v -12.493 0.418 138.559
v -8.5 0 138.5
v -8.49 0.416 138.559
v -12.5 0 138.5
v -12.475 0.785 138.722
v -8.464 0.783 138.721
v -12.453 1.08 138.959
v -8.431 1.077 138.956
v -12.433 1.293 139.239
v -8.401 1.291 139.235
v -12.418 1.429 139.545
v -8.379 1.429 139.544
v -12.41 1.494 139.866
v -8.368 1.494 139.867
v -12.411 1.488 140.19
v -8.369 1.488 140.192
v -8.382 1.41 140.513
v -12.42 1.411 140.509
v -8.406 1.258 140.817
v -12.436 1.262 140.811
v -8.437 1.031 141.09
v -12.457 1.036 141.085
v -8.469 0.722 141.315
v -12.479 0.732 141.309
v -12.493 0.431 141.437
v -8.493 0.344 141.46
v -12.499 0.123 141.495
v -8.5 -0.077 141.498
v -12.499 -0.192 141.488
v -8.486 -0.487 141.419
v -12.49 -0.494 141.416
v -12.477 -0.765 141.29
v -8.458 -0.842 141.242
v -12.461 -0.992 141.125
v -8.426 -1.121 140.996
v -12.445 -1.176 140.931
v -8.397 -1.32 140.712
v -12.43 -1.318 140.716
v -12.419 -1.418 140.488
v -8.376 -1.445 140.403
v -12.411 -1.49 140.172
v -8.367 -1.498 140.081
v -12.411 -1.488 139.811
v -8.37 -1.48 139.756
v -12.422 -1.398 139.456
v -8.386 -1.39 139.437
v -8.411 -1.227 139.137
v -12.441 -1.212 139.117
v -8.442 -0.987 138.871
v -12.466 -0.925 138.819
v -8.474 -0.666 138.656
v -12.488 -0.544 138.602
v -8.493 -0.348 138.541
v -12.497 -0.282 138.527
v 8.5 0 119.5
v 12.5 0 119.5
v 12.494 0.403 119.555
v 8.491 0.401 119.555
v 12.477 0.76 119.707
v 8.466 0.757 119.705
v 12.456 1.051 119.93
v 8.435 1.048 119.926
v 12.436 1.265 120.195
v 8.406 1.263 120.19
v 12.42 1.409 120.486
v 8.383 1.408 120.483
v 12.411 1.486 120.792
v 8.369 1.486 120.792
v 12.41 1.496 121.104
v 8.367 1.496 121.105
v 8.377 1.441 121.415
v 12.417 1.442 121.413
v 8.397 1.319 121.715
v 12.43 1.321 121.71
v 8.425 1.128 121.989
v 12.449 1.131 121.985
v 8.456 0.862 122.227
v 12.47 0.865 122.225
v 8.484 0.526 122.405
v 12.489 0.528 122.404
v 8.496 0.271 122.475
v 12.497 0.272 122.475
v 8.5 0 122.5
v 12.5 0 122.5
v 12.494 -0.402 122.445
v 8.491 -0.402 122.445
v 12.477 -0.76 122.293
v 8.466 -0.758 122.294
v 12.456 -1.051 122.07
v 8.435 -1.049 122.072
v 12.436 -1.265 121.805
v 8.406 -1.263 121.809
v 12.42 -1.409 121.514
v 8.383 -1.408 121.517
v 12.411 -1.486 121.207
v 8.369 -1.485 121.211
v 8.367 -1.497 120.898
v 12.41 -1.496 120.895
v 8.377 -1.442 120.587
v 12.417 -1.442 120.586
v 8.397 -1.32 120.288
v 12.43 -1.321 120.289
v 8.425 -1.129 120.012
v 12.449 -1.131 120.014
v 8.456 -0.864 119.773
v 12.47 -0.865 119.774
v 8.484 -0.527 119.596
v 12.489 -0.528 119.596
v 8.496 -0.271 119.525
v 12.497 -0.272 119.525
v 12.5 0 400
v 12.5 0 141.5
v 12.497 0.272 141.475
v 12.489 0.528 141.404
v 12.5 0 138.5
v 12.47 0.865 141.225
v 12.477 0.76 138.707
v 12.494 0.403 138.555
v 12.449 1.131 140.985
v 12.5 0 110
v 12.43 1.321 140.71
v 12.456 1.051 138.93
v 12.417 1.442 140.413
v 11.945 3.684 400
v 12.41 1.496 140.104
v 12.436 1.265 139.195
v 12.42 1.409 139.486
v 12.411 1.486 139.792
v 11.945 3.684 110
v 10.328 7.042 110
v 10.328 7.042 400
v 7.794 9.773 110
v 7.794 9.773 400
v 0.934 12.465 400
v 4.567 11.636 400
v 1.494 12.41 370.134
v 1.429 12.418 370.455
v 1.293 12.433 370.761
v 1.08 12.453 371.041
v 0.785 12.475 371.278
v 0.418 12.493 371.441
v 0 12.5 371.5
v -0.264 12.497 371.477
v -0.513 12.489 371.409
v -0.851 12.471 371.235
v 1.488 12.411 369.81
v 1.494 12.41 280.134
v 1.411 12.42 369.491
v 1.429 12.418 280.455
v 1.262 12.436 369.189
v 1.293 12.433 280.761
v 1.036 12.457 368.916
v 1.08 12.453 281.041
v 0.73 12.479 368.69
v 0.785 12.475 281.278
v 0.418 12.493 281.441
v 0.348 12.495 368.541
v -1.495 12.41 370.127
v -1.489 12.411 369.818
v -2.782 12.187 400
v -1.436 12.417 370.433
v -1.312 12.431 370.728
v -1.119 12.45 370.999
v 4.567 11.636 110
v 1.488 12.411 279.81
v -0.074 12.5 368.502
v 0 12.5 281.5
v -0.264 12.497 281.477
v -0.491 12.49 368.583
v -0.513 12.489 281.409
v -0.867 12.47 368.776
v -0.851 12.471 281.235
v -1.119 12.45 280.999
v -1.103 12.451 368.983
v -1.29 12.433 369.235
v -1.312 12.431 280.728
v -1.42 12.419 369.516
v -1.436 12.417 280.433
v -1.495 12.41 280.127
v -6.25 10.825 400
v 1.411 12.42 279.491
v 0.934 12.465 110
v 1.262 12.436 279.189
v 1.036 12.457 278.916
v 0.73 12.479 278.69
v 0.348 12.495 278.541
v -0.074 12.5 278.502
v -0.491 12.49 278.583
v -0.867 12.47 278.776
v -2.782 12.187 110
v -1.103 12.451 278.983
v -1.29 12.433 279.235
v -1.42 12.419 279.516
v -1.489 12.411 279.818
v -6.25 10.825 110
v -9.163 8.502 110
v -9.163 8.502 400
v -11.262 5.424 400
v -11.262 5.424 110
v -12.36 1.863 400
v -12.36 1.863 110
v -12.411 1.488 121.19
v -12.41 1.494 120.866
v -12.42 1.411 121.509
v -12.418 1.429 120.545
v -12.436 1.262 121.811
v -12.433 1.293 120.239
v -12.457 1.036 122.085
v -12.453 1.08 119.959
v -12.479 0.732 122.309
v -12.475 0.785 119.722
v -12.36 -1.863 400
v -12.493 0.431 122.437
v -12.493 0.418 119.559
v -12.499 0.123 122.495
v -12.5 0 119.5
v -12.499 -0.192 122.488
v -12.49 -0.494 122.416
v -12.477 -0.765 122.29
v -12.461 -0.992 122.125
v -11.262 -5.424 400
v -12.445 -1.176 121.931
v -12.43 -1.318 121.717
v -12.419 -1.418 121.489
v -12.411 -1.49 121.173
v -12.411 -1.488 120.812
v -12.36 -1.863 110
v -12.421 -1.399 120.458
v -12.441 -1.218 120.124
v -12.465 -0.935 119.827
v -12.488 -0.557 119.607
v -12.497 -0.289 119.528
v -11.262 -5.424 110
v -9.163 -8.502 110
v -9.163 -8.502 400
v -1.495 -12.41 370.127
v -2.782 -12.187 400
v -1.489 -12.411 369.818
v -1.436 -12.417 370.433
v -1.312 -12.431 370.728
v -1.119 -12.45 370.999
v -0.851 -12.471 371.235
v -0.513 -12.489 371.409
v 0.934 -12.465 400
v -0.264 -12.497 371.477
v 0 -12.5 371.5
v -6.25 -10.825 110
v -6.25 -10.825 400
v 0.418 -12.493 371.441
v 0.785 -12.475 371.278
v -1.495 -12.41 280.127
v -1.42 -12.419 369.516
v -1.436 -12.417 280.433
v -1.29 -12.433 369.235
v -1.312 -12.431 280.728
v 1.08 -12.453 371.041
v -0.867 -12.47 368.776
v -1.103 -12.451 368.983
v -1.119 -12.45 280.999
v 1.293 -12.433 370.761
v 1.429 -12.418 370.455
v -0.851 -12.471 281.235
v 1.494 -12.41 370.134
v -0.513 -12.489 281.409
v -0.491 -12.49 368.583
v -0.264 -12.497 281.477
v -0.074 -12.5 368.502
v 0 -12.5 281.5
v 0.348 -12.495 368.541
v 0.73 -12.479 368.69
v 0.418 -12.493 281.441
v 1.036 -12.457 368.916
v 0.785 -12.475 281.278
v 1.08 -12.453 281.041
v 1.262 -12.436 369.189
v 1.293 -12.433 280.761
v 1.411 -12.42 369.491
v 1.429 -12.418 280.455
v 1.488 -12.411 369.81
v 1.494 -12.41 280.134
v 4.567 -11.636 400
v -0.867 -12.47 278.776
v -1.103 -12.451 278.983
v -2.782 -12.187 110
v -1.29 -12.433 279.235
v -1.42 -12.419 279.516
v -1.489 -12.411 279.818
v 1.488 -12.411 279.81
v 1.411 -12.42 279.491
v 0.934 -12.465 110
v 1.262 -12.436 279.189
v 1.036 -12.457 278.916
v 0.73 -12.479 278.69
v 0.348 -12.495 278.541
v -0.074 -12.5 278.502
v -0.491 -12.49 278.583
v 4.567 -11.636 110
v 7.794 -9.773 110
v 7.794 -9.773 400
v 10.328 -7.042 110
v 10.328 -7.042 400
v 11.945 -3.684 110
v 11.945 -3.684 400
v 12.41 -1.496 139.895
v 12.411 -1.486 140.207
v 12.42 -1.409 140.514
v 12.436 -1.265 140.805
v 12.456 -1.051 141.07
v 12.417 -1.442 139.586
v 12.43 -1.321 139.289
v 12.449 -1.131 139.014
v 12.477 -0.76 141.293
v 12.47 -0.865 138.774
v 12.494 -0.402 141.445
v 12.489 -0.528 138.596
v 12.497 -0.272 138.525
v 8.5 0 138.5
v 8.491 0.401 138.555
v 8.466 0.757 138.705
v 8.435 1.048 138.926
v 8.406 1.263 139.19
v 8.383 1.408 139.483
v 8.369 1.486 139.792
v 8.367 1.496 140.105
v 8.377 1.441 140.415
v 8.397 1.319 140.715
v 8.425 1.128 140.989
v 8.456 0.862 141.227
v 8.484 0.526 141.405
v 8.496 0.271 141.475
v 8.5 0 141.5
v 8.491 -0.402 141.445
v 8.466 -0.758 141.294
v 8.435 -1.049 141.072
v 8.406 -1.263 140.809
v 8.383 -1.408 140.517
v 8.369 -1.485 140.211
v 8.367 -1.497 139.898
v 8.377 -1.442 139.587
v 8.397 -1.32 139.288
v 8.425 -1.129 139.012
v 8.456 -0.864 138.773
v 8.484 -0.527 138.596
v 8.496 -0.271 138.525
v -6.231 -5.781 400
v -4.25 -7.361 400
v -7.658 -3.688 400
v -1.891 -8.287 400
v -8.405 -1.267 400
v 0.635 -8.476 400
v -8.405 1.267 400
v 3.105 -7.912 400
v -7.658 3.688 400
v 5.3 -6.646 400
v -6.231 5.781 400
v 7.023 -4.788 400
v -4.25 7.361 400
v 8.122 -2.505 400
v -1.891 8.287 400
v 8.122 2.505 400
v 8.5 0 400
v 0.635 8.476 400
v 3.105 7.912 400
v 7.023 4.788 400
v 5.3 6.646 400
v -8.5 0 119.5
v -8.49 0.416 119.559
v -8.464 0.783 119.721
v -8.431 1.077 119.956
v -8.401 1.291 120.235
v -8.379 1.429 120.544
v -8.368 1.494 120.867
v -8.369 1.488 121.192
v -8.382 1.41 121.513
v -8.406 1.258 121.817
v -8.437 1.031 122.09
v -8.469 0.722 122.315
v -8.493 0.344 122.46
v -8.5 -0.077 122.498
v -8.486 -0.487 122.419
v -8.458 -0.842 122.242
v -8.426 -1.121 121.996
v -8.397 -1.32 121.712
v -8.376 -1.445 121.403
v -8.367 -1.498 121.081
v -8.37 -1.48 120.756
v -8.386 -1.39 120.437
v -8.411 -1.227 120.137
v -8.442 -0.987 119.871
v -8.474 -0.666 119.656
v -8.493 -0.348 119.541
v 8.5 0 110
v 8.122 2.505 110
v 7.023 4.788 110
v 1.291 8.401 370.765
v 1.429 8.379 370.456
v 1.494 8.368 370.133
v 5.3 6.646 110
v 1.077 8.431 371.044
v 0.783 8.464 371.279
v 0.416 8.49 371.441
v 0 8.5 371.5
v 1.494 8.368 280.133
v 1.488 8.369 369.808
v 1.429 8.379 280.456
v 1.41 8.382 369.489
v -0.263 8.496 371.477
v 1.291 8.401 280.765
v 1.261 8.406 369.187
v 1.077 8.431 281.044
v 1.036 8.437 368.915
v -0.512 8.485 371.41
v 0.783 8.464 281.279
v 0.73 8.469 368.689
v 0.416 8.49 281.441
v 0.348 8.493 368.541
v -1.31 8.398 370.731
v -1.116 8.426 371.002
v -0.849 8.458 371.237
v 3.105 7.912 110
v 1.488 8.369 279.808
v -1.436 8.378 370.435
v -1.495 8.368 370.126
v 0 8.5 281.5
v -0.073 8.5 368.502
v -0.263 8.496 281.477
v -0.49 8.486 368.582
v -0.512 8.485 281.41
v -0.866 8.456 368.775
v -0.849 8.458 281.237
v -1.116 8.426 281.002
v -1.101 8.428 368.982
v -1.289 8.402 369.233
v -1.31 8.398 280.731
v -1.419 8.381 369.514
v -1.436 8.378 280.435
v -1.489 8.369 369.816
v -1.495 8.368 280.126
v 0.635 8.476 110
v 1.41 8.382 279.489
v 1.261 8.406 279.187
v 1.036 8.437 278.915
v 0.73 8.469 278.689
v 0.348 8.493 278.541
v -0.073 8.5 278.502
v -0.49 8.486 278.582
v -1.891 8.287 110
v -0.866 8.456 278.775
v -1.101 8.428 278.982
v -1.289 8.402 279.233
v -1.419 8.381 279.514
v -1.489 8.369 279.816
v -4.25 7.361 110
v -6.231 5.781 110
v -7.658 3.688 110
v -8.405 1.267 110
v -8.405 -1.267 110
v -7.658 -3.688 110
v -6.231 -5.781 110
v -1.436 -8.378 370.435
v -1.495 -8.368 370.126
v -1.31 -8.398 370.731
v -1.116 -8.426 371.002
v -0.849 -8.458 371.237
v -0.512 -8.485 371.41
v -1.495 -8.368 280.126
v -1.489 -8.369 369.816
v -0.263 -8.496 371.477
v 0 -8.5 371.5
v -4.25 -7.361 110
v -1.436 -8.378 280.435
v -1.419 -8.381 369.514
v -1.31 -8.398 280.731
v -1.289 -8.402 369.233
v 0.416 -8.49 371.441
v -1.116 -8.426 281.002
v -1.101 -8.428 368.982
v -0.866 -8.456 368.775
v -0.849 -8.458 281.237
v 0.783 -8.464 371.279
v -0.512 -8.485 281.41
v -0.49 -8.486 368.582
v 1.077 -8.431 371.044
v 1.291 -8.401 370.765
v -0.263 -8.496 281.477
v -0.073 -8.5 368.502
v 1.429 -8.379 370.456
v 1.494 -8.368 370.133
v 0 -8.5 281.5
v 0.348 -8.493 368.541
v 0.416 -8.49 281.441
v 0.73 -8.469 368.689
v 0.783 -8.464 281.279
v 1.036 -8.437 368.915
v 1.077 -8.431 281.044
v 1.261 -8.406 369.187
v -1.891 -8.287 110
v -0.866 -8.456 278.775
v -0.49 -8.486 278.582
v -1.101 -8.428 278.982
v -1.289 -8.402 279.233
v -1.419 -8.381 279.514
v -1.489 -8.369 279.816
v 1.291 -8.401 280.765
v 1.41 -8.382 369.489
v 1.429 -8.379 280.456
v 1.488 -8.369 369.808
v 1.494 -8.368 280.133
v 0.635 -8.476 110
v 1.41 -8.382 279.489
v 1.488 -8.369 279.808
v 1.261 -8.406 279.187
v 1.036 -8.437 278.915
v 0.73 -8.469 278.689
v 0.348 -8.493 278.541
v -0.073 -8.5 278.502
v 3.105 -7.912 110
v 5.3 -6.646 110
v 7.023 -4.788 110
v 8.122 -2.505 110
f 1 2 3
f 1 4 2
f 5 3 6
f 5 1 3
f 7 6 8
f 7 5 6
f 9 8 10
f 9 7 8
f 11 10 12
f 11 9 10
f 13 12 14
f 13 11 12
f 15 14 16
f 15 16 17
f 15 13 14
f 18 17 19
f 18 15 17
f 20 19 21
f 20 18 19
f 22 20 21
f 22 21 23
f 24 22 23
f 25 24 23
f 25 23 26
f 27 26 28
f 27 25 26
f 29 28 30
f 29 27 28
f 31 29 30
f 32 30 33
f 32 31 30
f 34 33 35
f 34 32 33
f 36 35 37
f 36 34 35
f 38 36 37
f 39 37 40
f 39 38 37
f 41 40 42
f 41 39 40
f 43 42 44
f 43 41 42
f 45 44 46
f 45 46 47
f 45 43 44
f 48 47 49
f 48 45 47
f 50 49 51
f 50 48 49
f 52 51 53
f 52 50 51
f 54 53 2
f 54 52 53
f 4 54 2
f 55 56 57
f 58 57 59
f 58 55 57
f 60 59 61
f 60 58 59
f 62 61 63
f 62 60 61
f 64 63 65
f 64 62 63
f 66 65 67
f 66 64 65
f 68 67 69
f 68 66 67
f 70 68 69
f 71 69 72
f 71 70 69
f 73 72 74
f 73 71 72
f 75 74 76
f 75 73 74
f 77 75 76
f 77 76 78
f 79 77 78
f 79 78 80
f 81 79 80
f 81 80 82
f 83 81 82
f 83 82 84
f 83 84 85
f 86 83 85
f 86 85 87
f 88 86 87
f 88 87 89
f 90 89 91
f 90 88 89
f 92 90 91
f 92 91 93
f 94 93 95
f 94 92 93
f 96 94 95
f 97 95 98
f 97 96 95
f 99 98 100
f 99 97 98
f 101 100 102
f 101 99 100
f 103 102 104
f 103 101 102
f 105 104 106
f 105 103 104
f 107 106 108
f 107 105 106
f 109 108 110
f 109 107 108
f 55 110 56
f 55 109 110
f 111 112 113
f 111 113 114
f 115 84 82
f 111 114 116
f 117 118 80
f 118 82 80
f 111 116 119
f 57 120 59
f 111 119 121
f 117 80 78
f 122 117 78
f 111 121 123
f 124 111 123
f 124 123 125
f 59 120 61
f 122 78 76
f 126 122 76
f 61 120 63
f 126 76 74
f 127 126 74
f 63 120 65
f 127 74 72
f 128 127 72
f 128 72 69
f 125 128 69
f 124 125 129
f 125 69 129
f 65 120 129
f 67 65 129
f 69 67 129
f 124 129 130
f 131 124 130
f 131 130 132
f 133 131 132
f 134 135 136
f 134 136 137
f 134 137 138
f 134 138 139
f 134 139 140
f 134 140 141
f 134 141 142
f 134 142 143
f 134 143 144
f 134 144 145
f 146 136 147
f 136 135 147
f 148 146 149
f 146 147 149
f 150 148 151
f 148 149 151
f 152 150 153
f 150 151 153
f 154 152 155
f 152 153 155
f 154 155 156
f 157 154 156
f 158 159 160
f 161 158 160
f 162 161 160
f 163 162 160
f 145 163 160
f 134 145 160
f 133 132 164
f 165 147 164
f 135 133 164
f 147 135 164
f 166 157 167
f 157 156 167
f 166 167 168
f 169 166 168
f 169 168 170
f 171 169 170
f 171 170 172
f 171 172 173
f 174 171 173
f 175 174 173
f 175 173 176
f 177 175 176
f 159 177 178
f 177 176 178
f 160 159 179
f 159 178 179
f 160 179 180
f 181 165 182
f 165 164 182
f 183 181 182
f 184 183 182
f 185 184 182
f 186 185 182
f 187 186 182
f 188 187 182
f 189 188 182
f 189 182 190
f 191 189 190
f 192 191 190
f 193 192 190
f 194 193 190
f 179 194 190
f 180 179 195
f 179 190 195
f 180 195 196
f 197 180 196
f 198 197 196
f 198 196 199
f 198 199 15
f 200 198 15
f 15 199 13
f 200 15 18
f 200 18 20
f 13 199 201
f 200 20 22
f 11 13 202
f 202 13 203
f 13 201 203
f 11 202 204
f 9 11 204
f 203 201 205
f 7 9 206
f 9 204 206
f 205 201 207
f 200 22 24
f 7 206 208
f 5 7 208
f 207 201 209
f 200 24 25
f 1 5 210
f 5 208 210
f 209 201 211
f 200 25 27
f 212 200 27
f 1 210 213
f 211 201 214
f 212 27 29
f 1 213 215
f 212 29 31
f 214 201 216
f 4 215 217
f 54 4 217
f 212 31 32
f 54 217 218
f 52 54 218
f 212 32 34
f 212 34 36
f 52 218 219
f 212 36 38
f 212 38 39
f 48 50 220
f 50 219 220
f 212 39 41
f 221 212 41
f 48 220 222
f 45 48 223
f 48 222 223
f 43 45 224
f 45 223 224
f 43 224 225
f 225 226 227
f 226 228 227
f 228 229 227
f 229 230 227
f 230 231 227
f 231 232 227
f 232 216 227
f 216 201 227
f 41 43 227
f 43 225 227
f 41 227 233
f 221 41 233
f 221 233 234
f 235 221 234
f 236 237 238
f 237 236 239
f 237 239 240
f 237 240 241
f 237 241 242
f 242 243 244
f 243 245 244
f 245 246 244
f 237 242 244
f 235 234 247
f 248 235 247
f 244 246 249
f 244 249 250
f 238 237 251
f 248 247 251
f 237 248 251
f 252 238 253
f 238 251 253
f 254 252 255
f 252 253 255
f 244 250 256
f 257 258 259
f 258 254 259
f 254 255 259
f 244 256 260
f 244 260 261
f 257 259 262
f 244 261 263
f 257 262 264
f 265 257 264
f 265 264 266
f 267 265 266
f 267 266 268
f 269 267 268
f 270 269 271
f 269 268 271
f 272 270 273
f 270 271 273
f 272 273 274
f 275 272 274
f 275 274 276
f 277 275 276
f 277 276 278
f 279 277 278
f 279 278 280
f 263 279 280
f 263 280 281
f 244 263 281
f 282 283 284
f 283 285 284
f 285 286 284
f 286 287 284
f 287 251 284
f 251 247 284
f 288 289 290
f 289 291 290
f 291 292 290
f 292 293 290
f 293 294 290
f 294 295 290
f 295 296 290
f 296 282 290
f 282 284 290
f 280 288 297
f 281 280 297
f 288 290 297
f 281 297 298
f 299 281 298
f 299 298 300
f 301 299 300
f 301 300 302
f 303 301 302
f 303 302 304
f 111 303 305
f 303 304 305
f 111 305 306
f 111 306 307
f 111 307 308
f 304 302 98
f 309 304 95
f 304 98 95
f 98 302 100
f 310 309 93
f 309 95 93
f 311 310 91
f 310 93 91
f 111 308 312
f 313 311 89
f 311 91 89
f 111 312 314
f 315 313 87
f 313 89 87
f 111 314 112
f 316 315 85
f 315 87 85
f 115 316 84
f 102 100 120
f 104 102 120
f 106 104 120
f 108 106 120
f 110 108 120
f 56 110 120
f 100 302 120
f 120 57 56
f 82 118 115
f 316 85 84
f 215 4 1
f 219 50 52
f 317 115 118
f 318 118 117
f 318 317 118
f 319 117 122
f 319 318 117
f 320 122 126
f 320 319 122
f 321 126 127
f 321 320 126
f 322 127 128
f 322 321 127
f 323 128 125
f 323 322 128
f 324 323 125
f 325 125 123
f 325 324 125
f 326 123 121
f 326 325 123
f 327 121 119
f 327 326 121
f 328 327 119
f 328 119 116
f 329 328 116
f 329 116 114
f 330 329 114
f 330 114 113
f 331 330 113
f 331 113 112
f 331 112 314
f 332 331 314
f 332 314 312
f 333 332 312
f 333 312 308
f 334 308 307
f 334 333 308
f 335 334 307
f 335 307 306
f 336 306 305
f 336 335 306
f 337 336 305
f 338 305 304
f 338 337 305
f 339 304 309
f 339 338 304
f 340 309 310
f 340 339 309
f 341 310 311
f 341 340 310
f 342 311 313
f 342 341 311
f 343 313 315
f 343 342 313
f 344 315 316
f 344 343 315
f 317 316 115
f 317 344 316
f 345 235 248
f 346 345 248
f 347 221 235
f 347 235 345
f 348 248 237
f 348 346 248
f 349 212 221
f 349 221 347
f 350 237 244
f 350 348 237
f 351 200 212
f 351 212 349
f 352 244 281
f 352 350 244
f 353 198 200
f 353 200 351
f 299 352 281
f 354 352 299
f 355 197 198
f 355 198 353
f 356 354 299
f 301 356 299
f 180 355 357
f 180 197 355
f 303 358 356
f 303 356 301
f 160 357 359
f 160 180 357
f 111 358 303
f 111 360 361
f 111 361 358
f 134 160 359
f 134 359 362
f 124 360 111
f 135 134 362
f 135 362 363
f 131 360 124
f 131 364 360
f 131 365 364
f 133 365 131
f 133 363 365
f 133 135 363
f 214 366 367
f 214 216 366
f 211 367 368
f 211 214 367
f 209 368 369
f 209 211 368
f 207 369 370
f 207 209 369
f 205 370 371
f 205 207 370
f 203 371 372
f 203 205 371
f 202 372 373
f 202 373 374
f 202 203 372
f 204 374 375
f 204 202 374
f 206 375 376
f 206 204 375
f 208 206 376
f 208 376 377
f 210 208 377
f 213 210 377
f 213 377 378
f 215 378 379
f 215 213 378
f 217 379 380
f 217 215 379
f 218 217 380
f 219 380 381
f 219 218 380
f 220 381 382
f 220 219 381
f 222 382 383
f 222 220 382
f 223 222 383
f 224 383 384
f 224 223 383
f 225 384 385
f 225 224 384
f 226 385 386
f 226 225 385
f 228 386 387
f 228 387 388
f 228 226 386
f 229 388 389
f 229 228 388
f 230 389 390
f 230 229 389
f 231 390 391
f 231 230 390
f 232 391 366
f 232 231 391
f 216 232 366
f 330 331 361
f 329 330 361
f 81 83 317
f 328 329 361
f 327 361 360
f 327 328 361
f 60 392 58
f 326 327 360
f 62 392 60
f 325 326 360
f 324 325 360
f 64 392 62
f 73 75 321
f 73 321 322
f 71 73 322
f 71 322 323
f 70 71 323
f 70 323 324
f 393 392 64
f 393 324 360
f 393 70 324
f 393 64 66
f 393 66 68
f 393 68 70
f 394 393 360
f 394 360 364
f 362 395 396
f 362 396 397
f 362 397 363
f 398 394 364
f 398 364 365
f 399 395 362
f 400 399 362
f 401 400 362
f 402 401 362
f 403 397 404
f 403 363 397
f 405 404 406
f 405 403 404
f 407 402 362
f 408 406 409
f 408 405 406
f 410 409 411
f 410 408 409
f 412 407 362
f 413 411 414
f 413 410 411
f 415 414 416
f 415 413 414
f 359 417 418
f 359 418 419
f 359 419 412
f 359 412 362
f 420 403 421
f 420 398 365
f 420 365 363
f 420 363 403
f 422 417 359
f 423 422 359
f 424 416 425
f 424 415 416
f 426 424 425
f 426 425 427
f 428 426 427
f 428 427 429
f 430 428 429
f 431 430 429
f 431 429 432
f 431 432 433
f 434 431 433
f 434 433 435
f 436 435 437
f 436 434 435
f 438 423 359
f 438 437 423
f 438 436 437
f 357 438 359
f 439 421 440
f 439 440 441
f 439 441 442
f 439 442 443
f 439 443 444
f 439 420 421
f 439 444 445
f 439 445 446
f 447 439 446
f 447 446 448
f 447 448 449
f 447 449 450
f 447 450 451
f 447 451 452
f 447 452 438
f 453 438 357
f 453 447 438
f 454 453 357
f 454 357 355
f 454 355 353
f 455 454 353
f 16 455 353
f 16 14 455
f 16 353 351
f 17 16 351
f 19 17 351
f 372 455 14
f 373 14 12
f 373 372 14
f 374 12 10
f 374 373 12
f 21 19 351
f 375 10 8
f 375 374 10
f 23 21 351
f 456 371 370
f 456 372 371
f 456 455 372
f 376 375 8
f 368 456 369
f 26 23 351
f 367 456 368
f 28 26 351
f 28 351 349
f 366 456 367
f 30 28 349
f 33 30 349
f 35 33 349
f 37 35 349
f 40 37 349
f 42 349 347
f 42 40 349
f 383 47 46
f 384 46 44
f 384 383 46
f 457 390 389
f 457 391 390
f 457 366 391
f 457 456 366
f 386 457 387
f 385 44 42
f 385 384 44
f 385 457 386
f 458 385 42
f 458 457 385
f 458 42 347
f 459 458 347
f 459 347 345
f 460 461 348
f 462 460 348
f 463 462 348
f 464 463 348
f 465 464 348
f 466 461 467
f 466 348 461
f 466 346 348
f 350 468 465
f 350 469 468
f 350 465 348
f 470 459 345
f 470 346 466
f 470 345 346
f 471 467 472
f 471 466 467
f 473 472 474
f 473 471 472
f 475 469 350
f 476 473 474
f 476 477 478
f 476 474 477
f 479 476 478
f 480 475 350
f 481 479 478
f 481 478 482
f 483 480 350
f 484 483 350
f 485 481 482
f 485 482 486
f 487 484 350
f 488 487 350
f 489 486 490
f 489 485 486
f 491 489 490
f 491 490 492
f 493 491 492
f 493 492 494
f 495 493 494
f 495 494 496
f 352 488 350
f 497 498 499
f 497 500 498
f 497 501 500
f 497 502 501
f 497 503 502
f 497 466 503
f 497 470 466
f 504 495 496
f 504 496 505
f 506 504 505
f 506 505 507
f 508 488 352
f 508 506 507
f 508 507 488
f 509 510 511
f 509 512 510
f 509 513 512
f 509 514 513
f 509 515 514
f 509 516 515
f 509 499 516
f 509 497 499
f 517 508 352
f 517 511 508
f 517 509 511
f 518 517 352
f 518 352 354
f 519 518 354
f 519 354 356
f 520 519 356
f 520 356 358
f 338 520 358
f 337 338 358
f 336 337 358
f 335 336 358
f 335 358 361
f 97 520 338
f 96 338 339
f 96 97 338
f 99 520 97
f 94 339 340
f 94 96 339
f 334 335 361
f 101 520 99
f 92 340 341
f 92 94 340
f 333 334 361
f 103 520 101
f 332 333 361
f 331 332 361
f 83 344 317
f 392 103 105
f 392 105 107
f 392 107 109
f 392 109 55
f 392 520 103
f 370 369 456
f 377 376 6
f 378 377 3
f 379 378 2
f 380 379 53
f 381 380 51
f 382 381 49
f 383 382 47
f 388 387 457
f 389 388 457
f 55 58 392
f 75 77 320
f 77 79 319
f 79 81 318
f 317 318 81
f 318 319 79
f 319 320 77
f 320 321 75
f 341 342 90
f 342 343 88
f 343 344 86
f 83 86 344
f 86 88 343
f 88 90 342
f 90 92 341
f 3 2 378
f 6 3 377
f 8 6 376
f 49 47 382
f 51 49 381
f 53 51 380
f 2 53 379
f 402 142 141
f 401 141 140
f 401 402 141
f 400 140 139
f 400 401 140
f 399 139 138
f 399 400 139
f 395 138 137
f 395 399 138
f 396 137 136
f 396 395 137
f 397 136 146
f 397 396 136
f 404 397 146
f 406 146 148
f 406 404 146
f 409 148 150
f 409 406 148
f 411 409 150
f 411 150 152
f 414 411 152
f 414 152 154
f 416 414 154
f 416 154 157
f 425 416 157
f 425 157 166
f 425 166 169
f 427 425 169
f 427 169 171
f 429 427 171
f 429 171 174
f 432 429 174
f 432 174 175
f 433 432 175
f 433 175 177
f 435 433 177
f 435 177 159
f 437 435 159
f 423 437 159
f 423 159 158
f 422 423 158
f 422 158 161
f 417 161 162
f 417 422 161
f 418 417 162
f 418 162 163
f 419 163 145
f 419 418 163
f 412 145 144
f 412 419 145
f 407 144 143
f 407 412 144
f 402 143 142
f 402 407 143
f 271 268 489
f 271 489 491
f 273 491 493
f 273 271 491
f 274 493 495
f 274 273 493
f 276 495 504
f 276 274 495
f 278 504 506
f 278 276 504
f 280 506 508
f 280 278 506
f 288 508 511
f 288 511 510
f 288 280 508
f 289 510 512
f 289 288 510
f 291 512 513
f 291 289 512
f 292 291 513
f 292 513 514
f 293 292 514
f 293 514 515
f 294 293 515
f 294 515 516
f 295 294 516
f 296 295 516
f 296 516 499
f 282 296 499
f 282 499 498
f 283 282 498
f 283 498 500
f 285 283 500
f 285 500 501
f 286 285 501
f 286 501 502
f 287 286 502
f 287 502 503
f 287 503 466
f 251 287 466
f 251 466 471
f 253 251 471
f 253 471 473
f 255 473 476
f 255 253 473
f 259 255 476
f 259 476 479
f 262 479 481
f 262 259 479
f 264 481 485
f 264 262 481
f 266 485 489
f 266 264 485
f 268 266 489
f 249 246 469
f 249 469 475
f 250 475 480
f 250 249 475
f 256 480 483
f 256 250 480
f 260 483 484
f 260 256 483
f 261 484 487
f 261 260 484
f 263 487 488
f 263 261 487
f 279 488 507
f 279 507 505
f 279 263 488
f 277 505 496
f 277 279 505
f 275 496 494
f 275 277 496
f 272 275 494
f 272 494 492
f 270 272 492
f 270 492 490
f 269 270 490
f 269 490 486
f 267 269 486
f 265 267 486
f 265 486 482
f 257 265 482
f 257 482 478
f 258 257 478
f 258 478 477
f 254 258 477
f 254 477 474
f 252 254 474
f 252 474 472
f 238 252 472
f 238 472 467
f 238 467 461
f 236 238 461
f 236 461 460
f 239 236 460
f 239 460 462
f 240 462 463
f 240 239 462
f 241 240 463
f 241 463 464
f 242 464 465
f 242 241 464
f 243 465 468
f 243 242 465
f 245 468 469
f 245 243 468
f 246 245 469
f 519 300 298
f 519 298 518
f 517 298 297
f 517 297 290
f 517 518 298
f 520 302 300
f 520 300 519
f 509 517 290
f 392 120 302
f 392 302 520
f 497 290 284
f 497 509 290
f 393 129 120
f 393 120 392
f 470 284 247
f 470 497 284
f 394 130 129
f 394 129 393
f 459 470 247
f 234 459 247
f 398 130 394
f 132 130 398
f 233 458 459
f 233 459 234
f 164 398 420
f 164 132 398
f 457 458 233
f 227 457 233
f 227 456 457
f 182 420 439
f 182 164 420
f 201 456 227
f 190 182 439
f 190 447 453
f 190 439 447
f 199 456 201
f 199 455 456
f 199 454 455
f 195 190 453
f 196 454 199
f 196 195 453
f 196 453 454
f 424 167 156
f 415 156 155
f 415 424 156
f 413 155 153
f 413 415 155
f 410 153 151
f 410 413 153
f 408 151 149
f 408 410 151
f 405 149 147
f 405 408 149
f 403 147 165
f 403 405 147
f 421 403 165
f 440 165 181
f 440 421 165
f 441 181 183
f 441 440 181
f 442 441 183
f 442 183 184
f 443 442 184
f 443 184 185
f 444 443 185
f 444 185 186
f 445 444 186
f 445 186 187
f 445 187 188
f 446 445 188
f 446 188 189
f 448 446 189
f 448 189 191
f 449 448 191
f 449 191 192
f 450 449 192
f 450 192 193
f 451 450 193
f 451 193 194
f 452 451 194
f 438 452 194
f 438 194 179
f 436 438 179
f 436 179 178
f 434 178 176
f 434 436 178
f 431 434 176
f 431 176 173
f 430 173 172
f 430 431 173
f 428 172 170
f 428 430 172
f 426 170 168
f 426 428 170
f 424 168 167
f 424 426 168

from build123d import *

# Parameters (mm, degrees)
SKETCH1_R               = 12.5
SKETCH1_R_2             = 8.5
BOSS_EXTRUDE1_DEPTH     = 400
CUT_EXTRUDE1_DEPTH      = 401.390434451
CUT_EXTRUDE1_DEPTH_BACK = 401.390434451
SKETCH2_R               = 1.5
CUT_EXTRUDE2_DEPTH      = 401.390434558
CUT_EXTRUDE2_DEPTH_BACK = 401.390434558
SKETCH3_R               = 1.5
CUT_EXTRUDE3_DEPTH      = 401.390434559
CUT_EXTRUDE3_DEPTH_BACK = 110
SKETCH4_R               = 16.409503563


with BuildPart() as part:
    # Sketch1 → Boss-Extrude1 (new body)
    with BuildSketch(Plane.XY):
        Circle(SKETCH1_R)
        Circle(SKETCH1_R_2, mode=Mode.SUBTRACT)
    extrude(amount=BOSS_EXTRUDE1_DEPTH)

    # Sketch2 → Cut-Extrude1 (cut, two sides: drawn at the far end of the back side and taken through both)
    with BuildSketch(Plane(origin=(0, 0, 0), x_dir=(1, 0, 0), z_dir=(0, 1, 0)).offset(-CUT_EXTRUDE1_DEPTH_BACK)):
        with Locations(Location((0, -370, 0), (0, 0, 270))):
            Circle(SKETCH2_R)
        with Locations(Location((0, -280, 0), (0, 0, 270))):
            Circle(SKETCH2_R)
    extrude(amount=CUT_EXTRUDE1_DEPTH + CUT_EXTRUDE1_DEPTH_BACK, mode=Mode.SUBTRACT)

    # Sketch3 → Cut-Extrude2 (cut, two sides: drawn at the far end of the back side and taken through both)
    with BuildSketch(Plane(origin=(0, 0, 0), x_dir=(0, 0, -1), z_dir=(1, 0, 0)).offset(-CUT_EXTRUDE2_DEPTH_BACK)):
        with Locations((-121, 0)):
            Circle(SKETCH3_R)
        with Locations((-140, 0)):
            Circle(SKETCH3_R)
    extrude(amount=CUT_EXTRUDE2_DEPTH + CUT_EXTRUDE2_DEPTH_BACK, mode=Mode.SUBTRACT)

    # Sketch4 → Cut-Extrude3 (cut, two sides: drawn at the far end of the back side and taken through both)
    with BuildSketch(Plane(origin=(0, 0, 0), x_dir=(-1, 0, 0), z_dir=(0, 0, -1)).offset(-CUT_EXTRUDE3_DEPTH_BACK)):
        Circle(SKETCH4_R)
    extrude(amount=CUT_EXTRUDE3_DEPTH + CUT_EXTRUDE3_DEPTH_BACK, mode=Mode.SUBTRACT)


solid = part.part
